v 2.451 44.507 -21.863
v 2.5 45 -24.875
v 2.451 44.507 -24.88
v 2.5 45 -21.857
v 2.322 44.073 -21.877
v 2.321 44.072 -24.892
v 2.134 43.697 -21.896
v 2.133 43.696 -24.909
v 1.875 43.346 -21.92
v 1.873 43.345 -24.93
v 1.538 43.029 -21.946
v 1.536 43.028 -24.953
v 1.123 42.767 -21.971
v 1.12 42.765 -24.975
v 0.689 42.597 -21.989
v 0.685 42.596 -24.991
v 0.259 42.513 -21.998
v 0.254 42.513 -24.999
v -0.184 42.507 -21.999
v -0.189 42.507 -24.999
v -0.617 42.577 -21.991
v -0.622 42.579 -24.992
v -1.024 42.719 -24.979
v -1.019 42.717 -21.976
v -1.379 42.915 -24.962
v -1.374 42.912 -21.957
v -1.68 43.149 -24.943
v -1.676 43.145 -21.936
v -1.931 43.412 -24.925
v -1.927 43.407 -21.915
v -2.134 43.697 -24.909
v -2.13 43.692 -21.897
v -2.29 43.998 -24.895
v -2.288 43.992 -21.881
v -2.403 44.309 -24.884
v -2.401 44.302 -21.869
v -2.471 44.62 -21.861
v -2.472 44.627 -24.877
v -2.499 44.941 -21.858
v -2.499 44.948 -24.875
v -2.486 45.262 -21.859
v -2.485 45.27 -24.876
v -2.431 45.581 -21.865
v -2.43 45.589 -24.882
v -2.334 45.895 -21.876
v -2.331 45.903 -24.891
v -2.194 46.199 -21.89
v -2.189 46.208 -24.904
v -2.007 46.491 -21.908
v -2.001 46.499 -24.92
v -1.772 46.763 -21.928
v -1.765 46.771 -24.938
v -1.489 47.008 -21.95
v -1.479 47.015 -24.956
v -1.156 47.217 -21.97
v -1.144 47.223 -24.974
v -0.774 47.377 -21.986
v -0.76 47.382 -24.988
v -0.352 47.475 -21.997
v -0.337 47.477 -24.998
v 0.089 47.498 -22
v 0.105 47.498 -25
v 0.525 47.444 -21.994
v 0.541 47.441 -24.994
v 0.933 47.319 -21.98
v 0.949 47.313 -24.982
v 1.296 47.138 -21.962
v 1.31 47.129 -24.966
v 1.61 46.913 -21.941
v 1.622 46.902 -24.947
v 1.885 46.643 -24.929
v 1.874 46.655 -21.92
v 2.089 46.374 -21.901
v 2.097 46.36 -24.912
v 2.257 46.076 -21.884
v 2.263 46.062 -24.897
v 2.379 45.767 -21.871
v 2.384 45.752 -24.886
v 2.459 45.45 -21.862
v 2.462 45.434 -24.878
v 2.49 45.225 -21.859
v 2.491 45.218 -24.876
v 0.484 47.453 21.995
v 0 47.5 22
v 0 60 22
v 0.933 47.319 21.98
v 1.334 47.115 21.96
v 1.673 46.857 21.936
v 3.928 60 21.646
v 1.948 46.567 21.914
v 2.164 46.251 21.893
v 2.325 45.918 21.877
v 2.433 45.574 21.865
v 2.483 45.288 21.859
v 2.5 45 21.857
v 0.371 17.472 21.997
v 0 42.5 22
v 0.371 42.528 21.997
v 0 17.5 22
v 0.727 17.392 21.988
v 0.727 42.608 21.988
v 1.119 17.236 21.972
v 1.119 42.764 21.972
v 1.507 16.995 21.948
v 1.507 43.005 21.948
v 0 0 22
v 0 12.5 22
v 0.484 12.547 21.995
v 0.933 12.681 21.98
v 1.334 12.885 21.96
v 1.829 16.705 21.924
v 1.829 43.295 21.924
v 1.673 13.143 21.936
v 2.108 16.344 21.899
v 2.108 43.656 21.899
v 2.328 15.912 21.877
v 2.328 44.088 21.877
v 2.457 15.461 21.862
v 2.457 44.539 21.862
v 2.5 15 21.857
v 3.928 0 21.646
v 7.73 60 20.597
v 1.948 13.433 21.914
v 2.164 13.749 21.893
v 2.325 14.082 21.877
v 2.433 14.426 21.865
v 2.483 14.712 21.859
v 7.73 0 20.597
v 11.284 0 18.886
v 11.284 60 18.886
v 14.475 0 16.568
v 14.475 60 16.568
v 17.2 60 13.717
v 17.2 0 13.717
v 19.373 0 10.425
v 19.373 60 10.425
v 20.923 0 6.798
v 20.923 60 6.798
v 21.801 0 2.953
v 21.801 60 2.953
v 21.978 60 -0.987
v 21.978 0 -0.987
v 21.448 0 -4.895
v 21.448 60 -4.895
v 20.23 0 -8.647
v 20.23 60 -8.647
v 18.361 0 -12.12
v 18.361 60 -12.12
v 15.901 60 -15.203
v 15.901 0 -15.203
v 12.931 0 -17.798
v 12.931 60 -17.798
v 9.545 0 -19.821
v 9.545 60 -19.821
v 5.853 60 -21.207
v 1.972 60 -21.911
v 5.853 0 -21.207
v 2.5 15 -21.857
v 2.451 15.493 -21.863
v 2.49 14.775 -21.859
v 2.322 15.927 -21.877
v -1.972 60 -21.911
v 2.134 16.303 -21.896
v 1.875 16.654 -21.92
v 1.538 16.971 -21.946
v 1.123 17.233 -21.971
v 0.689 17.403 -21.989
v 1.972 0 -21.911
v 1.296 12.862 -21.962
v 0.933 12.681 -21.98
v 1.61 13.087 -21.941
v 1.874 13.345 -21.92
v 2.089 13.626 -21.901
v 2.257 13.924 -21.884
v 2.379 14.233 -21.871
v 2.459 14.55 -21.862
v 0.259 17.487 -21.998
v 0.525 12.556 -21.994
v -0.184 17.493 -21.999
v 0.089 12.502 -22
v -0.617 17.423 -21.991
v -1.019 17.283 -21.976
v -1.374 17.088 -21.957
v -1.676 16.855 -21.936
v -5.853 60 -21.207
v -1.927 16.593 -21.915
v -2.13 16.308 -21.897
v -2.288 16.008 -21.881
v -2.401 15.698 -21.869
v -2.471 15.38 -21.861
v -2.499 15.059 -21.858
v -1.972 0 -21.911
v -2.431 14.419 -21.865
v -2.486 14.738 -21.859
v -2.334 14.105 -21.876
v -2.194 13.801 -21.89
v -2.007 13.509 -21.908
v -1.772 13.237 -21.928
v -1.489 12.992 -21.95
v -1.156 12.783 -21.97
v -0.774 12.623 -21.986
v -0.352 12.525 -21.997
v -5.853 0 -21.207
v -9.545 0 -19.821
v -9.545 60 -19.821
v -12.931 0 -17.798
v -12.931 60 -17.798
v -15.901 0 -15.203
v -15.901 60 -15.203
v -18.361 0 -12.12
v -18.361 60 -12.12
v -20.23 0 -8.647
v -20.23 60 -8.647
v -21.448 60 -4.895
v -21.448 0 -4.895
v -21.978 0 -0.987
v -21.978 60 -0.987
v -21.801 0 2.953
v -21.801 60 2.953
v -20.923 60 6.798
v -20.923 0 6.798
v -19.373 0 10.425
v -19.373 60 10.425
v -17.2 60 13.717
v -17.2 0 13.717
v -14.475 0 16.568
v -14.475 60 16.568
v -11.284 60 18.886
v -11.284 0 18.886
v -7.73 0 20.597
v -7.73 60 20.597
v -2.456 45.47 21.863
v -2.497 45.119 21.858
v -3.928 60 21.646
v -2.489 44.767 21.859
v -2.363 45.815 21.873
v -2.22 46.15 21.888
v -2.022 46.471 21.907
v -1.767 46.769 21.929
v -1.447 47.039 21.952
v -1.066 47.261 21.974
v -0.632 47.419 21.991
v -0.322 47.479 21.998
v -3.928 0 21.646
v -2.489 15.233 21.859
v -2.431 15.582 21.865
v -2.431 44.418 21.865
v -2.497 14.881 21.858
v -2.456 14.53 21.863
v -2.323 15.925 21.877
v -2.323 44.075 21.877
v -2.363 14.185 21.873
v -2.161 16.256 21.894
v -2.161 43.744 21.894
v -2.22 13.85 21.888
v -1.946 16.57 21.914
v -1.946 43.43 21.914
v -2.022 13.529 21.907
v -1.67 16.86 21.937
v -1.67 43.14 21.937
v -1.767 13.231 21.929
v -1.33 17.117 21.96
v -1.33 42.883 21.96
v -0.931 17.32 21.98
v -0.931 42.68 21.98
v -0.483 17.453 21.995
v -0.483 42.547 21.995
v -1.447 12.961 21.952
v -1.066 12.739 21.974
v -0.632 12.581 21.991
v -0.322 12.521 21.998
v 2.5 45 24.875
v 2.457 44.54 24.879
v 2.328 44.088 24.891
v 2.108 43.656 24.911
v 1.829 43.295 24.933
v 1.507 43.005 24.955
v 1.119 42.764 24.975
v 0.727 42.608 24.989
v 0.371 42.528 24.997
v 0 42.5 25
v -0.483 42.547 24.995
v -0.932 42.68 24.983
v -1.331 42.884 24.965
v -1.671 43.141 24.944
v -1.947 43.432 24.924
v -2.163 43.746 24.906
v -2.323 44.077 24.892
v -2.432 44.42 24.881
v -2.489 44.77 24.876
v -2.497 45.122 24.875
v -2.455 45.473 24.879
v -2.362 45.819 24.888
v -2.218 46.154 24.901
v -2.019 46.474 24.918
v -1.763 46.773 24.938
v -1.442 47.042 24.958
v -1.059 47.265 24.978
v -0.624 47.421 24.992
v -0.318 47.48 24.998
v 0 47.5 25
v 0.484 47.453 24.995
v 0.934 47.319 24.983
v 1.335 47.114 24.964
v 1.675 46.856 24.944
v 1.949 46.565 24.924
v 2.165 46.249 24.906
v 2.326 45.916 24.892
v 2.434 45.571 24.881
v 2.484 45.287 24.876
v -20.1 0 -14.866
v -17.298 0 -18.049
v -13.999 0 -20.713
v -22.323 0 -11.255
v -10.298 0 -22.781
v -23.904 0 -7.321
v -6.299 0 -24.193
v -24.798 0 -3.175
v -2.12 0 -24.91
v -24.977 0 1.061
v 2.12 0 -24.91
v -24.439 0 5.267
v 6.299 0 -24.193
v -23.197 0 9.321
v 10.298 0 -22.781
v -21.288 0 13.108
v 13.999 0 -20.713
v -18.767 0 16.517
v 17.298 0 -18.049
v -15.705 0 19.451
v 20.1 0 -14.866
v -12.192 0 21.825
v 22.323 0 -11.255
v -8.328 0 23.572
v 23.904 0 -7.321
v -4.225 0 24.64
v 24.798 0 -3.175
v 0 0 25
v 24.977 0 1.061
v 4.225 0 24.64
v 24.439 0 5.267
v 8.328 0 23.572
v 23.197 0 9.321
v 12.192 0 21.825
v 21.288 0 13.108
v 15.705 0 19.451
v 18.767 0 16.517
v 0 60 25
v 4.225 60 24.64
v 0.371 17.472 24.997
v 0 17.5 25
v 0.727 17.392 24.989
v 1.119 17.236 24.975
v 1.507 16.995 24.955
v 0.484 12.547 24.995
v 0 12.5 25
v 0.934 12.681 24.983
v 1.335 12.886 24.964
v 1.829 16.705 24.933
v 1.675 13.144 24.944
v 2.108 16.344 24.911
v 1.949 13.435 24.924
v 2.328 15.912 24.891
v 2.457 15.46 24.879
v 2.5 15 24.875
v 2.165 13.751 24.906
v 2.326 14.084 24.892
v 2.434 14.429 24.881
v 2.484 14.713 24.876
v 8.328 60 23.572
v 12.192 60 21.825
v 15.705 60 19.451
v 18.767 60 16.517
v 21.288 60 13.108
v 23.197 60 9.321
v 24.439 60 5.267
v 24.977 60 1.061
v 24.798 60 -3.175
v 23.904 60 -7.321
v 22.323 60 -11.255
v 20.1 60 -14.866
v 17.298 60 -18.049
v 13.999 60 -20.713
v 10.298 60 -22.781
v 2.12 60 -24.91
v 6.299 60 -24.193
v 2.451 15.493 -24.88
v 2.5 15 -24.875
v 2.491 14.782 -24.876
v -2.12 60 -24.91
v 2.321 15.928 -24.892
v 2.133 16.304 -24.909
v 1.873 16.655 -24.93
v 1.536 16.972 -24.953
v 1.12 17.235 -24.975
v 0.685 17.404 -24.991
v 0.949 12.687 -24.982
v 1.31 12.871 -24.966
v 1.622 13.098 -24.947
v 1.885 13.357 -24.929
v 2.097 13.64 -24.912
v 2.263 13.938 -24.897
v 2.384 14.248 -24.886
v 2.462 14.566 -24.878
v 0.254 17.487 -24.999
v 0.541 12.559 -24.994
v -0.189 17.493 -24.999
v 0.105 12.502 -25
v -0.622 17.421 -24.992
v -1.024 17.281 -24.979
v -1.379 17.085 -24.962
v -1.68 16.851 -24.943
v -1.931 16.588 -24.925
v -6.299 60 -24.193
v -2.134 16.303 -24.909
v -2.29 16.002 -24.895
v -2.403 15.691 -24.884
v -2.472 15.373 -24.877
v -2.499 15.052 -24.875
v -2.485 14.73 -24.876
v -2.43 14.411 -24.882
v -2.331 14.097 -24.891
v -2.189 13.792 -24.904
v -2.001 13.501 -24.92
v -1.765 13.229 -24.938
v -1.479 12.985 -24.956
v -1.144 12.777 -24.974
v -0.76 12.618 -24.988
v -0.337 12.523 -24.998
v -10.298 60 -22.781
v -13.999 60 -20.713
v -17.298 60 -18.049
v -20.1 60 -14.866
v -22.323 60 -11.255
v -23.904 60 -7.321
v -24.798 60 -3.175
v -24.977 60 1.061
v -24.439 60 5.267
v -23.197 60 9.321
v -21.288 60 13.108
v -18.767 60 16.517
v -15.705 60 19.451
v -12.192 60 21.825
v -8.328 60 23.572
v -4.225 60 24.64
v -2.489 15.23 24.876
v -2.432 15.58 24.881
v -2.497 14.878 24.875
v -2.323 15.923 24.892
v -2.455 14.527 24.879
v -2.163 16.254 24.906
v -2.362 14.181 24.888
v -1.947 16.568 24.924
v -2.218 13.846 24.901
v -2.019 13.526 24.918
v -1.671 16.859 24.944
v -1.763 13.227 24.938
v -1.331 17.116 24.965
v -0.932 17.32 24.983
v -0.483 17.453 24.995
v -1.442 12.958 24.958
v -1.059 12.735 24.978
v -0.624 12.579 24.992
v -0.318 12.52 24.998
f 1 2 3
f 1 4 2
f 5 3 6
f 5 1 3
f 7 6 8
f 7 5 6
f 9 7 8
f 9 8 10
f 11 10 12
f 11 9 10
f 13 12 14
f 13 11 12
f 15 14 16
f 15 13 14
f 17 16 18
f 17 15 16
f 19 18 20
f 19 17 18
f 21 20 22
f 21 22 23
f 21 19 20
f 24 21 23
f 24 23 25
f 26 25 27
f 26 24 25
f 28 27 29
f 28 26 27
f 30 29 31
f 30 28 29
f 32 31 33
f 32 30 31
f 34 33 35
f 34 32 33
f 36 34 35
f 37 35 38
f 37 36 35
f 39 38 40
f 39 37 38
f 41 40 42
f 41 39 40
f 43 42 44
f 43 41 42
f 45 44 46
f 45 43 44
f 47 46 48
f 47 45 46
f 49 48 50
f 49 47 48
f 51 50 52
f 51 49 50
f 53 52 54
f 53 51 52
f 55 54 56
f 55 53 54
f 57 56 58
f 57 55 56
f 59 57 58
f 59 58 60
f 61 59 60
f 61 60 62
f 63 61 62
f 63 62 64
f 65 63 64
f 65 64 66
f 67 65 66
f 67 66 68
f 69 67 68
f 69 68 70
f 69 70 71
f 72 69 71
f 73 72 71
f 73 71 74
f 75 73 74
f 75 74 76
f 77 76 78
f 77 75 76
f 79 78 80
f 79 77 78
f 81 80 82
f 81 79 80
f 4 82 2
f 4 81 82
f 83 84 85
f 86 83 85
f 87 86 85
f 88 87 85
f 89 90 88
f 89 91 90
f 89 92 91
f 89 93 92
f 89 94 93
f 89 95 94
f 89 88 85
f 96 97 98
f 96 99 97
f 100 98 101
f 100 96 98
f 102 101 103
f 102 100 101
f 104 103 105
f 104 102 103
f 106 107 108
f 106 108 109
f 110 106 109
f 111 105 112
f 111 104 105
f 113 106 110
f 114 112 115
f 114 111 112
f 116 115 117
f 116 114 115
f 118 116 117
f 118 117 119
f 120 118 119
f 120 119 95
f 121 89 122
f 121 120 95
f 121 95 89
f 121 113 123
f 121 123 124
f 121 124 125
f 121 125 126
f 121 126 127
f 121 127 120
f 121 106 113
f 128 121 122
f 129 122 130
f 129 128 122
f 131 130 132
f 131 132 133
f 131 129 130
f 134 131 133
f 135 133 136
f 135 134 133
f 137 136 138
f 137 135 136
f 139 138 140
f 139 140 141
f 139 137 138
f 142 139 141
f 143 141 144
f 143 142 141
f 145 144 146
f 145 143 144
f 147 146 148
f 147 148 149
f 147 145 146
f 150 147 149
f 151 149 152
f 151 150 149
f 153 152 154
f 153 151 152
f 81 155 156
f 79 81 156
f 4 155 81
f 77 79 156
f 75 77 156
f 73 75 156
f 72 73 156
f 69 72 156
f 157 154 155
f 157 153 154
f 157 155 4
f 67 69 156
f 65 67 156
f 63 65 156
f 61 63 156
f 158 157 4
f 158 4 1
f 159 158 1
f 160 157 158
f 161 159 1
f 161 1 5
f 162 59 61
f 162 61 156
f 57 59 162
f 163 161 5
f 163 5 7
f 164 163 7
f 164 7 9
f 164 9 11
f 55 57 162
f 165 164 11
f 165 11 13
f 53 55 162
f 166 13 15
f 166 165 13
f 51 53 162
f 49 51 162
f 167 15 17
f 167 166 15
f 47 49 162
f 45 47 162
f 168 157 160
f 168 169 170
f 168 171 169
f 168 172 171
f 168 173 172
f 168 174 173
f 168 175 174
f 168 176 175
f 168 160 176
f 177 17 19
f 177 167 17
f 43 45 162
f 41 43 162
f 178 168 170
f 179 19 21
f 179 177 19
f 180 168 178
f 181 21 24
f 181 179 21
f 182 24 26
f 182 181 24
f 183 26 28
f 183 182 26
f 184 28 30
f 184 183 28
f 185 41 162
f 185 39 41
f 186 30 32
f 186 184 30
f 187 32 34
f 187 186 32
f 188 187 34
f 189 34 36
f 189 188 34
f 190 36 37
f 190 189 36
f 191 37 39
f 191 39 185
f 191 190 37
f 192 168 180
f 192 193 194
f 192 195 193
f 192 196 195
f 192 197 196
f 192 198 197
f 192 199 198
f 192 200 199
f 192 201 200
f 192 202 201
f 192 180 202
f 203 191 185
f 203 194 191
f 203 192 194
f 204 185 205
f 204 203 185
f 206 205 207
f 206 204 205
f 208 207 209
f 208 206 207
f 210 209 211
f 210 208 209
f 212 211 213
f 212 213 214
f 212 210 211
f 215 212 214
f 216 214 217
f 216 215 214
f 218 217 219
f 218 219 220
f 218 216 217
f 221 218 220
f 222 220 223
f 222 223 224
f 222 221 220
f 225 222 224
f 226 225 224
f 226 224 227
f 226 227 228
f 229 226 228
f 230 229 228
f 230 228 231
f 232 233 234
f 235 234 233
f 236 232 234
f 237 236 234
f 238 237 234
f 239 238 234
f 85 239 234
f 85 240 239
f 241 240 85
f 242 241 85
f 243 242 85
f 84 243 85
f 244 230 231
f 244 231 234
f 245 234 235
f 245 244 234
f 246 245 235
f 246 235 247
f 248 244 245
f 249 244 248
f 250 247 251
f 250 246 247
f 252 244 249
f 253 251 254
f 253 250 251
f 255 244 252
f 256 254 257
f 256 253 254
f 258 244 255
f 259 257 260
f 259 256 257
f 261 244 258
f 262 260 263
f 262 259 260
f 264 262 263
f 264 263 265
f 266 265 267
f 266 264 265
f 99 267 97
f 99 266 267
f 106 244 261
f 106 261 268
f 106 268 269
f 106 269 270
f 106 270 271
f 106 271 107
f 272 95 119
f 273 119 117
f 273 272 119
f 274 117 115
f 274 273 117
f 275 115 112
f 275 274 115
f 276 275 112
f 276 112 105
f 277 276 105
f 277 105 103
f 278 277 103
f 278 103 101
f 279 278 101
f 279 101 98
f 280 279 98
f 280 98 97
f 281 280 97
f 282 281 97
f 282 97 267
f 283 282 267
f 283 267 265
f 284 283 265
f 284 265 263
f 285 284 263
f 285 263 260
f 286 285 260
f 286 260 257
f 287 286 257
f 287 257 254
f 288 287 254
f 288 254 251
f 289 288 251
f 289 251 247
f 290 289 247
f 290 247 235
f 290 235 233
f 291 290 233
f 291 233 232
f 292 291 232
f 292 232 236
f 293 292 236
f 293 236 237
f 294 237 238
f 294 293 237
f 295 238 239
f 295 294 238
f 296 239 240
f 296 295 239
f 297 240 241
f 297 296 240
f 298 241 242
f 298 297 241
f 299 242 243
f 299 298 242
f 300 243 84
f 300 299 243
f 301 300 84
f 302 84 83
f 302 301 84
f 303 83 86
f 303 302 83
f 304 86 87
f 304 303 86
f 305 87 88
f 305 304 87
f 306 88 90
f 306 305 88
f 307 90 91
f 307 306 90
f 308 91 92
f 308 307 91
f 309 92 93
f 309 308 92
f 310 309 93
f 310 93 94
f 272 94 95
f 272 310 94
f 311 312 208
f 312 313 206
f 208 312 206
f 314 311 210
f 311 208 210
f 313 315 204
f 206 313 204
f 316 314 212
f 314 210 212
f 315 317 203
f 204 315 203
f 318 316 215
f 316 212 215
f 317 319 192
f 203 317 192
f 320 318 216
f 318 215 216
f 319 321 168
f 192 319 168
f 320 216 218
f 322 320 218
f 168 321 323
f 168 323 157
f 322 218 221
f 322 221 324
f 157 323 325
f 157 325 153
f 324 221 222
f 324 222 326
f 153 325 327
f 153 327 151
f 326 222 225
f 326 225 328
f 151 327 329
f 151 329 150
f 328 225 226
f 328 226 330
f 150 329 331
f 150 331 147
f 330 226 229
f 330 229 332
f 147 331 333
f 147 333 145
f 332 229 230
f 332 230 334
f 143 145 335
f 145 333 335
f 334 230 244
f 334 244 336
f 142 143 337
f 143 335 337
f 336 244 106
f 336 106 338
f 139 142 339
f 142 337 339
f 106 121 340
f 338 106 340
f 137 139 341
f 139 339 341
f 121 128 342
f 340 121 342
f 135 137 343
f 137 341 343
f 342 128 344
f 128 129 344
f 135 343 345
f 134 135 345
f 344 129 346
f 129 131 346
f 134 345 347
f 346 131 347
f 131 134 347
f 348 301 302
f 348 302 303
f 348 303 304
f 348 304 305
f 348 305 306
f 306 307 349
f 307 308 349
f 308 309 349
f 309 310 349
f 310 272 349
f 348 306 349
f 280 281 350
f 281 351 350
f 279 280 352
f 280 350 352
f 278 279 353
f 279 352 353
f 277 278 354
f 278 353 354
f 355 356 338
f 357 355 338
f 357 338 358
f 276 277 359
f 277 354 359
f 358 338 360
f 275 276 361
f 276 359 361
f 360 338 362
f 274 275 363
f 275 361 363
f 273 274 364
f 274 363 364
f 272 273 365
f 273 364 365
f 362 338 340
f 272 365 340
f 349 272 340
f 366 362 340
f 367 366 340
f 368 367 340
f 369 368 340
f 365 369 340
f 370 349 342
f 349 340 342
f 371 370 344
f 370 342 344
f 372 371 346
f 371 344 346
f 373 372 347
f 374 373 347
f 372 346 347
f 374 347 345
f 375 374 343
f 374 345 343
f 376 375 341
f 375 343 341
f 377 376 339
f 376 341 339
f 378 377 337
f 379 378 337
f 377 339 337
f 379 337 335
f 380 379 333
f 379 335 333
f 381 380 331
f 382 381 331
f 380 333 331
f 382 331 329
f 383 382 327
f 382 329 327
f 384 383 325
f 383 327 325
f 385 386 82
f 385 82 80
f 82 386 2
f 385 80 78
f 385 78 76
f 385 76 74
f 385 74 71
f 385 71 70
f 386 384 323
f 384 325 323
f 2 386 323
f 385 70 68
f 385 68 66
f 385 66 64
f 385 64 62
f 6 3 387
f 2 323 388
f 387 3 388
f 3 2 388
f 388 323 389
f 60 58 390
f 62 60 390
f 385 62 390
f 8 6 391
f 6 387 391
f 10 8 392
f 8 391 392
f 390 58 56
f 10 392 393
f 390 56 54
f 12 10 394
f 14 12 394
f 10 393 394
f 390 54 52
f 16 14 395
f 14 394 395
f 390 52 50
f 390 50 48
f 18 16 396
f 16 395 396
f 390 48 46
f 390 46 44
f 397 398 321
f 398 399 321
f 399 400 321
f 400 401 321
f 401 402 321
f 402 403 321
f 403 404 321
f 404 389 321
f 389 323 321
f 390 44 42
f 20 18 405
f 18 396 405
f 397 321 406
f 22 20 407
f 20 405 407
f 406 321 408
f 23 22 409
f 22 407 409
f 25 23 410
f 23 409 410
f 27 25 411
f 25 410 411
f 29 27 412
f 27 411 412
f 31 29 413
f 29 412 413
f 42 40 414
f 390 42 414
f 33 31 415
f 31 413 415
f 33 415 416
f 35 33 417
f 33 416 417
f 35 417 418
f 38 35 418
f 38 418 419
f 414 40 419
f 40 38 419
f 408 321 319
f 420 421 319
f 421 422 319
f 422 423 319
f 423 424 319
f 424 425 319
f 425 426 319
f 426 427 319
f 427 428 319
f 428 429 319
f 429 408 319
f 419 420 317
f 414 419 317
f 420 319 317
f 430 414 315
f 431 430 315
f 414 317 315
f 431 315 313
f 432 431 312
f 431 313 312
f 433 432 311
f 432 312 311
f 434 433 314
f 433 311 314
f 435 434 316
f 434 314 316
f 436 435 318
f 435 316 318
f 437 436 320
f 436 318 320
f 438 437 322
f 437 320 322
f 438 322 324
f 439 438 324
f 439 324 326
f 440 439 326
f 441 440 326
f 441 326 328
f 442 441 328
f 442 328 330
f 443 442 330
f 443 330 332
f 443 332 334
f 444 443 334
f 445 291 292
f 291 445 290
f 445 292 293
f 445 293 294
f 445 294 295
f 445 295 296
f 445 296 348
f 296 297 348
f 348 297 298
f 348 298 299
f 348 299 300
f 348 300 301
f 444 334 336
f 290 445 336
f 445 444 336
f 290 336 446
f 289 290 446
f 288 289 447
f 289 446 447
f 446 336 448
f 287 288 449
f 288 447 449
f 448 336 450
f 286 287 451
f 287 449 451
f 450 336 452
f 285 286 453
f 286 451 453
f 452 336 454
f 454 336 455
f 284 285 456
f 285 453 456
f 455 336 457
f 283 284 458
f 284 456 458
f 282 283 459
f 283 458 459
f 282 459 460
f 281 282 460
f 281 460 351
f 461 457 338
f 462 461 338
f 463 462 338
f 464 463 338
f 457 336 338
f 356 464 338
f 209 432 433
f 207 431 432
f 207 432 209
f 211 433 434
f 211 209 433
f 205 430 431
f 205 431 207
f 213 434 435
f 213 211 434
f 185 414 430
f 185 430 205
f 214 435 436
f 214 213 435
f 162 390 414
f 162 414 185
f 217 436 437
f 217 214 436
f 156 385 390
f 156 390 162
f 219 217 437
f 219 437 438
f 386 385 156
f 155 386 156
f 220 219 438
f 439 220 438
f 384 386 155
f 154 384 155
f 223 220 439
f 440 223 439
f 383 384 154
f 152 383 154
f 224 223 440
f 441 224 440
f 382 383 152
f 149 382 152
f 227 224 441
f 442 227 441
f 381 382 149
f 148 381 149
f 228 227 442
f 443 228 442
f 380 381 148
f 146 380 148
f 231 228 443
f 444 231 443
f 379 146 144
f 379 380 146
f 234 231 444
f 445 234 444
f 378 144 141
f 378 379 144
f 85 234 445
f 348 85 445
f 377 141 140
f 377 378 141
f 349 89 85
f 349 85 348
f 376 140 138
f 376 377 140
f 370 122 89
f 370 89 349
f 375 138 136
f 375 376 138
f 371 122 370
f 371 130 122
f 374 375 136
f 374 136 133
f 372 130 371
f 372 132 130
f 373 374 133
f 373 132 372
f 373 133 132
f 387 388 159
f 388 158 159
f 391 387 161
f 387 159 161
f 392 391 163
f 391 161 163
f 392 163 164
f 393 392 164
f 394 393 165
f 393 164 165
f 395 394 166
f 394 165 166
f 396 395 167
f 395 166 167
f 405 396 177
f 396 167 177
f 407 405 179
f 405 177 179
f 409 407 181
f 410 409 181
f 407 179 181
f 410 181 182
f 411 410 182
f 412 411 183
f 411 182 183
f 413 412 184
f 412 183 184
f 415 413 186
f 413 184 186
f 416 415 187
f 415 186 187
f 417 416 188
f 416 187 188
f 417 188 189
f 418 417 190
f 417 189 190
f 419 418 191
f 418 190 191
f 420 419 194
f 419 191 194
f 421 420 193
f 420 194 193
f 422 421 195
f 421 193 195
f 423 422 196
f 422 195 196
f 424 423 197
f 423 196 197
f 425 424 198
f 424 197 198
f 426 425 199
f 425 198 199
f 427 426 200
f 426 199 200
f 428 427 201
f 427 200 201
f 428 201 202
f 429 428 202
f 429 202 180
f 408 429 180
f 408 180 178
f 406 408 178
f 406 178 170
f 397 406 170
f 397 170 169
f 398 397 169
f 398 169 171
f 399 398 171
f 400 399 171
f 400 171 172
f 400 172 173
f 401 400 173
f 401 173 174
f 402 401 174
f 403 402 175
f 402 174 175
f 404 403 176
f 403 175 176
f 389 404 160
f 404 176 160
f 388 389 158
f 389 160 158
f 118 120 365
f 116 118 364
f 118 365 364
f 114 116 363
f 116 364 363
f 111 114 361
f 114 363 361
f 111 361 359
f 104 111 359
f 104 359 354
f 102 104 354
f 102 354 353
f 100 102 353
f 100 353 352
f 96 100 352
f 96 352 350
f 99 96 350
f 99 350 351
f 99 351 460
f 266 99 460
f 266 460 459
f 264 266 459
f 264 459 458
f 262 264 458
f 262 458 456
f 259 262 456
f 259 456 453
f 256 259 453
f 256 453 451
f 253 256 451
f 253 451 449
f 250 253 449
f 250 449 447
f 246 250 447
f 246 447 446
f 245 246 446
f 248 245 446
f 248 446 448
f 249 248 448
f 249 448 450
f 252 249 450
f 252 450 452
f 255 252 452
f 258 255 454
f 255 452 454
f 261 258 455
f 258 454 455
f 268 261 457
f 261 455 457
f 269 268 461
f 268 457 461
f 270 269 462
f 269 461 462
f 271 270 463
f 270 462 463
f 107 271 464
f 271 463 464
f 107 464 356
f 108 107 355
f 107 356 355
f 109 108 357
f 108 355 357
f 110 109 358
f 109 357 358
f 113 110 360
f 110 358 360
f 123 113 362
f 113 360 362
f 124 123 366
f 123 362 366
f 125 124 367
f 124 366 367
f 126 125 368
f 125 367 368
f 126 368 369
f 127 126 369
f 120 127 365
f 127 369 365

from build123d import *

# Parameters (mm, degrees)
ESBO_O1_R                = 25
ESBO_O1_R_2              = 22
RESSALTO_EXTRUS_O1_DEPTH = 60
ESBO_O2_R                = 2.5
CORTE_EXTRUS_O1_DEPTH    = 70.641941386


with BuildPart() as part:
    # Esboço1 → Ressalto-extrusão1 (new body)
    with BuildSketch(Plane(origin=(0, 0, 0), x_dir=(1, 0, 0), z_dir=(0, 1, 0))):
        with Locations(Location((0, 0, 0), (0, 0, 270))):
            Circle(ESBO_O1_R)
        with Locations(Location((0, 0, 0), (0, 0, 270))):
            Circle(ESBO_O1_R_2, mode=Mode.SUBTRACT)
    extrude(amount=RESSALTO_EXTRUS_O1_DEPTH)

    # Esboço2 → Corte-extrusão1 (cut, symmetric)
    with BuildSketch(Plane.XY):
        with Locations((0, 15)):
            Circle(ESBO_O2_R)
    corte_extrus_o1 = extrude(amount=CORTE_EXTRUS_O1_DEPTH, both=True, mode=Mode.SUBTRACT)

    # Espelhar1: Corte-extrusão1 across plane
    add(corte_extrus_o1.mirror(Plane(origin=(0, 30, 0), x_dir=(0, 0, 1), z_dir=(0, -1, 0))), mode=Mode.SUBTRACT)


solid = part.part
